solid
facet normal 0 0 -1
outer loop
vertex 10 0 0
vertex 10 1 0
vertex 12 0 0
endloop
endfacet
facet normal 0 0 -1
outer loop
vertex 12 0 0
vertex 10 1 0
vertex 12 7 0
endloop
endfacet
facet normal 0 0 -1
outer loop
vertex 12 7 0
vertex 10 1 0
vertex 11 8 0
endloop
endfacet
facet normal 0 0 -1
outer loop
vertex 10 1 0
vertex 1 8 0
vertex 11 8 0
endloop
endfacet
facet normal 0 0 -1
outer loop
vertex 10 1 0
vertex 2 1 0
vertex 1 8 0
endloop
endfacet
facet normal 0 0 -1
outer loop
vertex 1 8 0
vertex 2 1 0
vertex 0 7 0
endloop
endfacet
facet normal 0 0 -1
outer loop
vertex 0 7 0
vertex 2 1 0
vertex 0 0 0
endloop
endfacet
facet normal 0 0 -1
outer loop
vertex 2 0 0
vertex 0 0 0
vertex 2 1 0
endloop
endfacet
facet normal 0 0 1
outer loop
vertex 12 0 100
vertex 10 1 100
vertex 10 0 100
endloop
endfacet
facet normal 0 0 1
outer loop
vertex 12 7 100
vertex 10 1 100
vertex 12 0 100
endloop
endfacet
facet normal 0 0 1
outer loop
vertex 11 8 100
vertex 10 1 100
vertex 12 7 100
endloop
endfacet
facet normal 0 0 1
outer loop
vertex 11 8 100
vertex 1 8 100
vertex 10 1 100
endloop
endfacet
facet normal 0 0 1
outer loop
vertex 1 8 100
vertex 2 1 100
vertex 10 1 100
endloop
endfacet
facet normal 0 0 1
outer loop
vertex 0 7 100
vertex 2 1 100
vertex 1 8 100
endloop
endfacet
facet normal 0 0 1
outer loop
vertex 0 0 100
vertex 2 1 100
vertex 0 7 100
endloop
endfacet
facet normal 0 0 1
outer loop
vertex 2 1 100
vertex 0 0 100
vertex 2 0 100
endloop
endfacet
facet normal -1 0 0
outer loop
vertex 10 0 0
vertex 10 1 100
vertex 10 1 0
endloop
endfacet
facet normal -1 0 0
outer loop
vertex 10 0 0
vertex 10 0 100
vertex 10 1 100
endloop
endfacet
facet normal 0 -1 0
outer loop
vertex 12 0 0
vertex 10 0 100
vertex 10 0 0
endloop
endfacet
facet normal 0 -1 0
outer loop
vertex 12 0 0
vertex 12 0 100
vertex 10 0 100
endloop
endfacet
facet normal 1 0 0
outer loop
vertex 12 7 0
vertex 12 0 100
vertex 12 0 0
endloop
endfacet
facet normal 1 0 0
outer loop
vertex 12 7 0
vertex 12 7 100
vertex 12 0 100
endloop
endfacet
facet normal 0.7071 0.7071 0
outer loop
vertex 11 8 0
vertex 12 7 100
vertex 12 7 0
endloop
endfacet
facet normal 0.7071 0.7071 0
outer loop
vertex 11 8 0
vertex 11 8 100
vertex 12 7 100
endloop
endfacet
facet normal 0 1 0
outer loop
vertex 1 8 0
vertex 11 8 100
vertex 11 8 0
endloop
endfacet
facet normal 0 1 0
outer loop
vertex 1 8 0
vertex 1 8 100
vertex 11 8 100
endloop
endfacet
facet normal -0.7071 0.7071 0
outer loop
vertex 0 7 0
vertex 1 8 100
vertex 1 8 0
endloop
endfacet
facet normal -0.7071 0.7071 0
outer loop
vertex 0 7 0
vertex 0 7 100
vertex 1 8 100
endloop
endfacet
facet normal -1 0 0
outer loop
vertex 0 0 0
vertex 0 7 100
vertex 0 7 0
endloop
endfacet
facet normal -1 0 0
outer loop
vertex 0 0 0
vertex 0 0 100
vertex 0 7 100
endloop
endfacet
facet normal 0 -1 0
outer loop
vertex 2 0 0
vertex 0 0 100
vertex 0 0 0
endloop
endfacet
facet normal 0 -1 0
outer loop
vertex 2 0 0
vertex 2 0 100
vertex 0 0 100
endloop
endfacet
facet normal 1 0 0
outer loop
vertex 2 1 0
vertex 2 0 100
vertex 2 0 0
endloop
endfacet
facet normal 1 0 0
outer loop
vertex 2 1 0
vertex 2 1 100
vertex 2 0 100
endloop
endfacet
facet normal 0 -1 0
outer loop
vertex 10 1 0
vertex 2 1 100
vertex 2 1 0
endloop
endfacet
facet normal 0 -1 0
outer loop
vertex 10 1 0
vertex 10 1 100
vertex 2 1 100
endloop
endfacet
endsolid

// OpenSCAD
$fn = 64;

// Miniature linear guide rail parameters (mm)
rail_w = 12.0;
rail_h = 8.0;
rail_l = 100.0;

// Simple rail profile details
top_flat_w = 6.0;          // flat on top
side_chamfer = 1.0;        // chamfer size
bottom_relief_w = 8.0;     // slight bottom relief width
bottom_relief_h = 1.0;     // relief depth

module rail_profile() {
    // Outer shape with chamfered top edges
    difference() {
        // Main body with chamfered top corners
        polygon(points=[
            [0, 0],
            [rail_w, 0],
            [rail_w, rail_h - side_chamfer],
            [rail_w - side_chamfer, rail_h],
            [(rail_w + top_flat_w)/2, rail_h],
            [(rail_w - top_flat_w)/2, rail_h],
            [side_chamfer, rail_h],
            [0, rail_h - side_chamfer]
        ]);

        // Bottom relief (centered)
        translate([(rail_w - bottom_relief_w)/2, 0])
            square([bottom_relief_w, bottom_relief_h], center=false);
    }
}

linear_extrude(height=rail_l, center=false, convexity=10)
    rail_profile();
